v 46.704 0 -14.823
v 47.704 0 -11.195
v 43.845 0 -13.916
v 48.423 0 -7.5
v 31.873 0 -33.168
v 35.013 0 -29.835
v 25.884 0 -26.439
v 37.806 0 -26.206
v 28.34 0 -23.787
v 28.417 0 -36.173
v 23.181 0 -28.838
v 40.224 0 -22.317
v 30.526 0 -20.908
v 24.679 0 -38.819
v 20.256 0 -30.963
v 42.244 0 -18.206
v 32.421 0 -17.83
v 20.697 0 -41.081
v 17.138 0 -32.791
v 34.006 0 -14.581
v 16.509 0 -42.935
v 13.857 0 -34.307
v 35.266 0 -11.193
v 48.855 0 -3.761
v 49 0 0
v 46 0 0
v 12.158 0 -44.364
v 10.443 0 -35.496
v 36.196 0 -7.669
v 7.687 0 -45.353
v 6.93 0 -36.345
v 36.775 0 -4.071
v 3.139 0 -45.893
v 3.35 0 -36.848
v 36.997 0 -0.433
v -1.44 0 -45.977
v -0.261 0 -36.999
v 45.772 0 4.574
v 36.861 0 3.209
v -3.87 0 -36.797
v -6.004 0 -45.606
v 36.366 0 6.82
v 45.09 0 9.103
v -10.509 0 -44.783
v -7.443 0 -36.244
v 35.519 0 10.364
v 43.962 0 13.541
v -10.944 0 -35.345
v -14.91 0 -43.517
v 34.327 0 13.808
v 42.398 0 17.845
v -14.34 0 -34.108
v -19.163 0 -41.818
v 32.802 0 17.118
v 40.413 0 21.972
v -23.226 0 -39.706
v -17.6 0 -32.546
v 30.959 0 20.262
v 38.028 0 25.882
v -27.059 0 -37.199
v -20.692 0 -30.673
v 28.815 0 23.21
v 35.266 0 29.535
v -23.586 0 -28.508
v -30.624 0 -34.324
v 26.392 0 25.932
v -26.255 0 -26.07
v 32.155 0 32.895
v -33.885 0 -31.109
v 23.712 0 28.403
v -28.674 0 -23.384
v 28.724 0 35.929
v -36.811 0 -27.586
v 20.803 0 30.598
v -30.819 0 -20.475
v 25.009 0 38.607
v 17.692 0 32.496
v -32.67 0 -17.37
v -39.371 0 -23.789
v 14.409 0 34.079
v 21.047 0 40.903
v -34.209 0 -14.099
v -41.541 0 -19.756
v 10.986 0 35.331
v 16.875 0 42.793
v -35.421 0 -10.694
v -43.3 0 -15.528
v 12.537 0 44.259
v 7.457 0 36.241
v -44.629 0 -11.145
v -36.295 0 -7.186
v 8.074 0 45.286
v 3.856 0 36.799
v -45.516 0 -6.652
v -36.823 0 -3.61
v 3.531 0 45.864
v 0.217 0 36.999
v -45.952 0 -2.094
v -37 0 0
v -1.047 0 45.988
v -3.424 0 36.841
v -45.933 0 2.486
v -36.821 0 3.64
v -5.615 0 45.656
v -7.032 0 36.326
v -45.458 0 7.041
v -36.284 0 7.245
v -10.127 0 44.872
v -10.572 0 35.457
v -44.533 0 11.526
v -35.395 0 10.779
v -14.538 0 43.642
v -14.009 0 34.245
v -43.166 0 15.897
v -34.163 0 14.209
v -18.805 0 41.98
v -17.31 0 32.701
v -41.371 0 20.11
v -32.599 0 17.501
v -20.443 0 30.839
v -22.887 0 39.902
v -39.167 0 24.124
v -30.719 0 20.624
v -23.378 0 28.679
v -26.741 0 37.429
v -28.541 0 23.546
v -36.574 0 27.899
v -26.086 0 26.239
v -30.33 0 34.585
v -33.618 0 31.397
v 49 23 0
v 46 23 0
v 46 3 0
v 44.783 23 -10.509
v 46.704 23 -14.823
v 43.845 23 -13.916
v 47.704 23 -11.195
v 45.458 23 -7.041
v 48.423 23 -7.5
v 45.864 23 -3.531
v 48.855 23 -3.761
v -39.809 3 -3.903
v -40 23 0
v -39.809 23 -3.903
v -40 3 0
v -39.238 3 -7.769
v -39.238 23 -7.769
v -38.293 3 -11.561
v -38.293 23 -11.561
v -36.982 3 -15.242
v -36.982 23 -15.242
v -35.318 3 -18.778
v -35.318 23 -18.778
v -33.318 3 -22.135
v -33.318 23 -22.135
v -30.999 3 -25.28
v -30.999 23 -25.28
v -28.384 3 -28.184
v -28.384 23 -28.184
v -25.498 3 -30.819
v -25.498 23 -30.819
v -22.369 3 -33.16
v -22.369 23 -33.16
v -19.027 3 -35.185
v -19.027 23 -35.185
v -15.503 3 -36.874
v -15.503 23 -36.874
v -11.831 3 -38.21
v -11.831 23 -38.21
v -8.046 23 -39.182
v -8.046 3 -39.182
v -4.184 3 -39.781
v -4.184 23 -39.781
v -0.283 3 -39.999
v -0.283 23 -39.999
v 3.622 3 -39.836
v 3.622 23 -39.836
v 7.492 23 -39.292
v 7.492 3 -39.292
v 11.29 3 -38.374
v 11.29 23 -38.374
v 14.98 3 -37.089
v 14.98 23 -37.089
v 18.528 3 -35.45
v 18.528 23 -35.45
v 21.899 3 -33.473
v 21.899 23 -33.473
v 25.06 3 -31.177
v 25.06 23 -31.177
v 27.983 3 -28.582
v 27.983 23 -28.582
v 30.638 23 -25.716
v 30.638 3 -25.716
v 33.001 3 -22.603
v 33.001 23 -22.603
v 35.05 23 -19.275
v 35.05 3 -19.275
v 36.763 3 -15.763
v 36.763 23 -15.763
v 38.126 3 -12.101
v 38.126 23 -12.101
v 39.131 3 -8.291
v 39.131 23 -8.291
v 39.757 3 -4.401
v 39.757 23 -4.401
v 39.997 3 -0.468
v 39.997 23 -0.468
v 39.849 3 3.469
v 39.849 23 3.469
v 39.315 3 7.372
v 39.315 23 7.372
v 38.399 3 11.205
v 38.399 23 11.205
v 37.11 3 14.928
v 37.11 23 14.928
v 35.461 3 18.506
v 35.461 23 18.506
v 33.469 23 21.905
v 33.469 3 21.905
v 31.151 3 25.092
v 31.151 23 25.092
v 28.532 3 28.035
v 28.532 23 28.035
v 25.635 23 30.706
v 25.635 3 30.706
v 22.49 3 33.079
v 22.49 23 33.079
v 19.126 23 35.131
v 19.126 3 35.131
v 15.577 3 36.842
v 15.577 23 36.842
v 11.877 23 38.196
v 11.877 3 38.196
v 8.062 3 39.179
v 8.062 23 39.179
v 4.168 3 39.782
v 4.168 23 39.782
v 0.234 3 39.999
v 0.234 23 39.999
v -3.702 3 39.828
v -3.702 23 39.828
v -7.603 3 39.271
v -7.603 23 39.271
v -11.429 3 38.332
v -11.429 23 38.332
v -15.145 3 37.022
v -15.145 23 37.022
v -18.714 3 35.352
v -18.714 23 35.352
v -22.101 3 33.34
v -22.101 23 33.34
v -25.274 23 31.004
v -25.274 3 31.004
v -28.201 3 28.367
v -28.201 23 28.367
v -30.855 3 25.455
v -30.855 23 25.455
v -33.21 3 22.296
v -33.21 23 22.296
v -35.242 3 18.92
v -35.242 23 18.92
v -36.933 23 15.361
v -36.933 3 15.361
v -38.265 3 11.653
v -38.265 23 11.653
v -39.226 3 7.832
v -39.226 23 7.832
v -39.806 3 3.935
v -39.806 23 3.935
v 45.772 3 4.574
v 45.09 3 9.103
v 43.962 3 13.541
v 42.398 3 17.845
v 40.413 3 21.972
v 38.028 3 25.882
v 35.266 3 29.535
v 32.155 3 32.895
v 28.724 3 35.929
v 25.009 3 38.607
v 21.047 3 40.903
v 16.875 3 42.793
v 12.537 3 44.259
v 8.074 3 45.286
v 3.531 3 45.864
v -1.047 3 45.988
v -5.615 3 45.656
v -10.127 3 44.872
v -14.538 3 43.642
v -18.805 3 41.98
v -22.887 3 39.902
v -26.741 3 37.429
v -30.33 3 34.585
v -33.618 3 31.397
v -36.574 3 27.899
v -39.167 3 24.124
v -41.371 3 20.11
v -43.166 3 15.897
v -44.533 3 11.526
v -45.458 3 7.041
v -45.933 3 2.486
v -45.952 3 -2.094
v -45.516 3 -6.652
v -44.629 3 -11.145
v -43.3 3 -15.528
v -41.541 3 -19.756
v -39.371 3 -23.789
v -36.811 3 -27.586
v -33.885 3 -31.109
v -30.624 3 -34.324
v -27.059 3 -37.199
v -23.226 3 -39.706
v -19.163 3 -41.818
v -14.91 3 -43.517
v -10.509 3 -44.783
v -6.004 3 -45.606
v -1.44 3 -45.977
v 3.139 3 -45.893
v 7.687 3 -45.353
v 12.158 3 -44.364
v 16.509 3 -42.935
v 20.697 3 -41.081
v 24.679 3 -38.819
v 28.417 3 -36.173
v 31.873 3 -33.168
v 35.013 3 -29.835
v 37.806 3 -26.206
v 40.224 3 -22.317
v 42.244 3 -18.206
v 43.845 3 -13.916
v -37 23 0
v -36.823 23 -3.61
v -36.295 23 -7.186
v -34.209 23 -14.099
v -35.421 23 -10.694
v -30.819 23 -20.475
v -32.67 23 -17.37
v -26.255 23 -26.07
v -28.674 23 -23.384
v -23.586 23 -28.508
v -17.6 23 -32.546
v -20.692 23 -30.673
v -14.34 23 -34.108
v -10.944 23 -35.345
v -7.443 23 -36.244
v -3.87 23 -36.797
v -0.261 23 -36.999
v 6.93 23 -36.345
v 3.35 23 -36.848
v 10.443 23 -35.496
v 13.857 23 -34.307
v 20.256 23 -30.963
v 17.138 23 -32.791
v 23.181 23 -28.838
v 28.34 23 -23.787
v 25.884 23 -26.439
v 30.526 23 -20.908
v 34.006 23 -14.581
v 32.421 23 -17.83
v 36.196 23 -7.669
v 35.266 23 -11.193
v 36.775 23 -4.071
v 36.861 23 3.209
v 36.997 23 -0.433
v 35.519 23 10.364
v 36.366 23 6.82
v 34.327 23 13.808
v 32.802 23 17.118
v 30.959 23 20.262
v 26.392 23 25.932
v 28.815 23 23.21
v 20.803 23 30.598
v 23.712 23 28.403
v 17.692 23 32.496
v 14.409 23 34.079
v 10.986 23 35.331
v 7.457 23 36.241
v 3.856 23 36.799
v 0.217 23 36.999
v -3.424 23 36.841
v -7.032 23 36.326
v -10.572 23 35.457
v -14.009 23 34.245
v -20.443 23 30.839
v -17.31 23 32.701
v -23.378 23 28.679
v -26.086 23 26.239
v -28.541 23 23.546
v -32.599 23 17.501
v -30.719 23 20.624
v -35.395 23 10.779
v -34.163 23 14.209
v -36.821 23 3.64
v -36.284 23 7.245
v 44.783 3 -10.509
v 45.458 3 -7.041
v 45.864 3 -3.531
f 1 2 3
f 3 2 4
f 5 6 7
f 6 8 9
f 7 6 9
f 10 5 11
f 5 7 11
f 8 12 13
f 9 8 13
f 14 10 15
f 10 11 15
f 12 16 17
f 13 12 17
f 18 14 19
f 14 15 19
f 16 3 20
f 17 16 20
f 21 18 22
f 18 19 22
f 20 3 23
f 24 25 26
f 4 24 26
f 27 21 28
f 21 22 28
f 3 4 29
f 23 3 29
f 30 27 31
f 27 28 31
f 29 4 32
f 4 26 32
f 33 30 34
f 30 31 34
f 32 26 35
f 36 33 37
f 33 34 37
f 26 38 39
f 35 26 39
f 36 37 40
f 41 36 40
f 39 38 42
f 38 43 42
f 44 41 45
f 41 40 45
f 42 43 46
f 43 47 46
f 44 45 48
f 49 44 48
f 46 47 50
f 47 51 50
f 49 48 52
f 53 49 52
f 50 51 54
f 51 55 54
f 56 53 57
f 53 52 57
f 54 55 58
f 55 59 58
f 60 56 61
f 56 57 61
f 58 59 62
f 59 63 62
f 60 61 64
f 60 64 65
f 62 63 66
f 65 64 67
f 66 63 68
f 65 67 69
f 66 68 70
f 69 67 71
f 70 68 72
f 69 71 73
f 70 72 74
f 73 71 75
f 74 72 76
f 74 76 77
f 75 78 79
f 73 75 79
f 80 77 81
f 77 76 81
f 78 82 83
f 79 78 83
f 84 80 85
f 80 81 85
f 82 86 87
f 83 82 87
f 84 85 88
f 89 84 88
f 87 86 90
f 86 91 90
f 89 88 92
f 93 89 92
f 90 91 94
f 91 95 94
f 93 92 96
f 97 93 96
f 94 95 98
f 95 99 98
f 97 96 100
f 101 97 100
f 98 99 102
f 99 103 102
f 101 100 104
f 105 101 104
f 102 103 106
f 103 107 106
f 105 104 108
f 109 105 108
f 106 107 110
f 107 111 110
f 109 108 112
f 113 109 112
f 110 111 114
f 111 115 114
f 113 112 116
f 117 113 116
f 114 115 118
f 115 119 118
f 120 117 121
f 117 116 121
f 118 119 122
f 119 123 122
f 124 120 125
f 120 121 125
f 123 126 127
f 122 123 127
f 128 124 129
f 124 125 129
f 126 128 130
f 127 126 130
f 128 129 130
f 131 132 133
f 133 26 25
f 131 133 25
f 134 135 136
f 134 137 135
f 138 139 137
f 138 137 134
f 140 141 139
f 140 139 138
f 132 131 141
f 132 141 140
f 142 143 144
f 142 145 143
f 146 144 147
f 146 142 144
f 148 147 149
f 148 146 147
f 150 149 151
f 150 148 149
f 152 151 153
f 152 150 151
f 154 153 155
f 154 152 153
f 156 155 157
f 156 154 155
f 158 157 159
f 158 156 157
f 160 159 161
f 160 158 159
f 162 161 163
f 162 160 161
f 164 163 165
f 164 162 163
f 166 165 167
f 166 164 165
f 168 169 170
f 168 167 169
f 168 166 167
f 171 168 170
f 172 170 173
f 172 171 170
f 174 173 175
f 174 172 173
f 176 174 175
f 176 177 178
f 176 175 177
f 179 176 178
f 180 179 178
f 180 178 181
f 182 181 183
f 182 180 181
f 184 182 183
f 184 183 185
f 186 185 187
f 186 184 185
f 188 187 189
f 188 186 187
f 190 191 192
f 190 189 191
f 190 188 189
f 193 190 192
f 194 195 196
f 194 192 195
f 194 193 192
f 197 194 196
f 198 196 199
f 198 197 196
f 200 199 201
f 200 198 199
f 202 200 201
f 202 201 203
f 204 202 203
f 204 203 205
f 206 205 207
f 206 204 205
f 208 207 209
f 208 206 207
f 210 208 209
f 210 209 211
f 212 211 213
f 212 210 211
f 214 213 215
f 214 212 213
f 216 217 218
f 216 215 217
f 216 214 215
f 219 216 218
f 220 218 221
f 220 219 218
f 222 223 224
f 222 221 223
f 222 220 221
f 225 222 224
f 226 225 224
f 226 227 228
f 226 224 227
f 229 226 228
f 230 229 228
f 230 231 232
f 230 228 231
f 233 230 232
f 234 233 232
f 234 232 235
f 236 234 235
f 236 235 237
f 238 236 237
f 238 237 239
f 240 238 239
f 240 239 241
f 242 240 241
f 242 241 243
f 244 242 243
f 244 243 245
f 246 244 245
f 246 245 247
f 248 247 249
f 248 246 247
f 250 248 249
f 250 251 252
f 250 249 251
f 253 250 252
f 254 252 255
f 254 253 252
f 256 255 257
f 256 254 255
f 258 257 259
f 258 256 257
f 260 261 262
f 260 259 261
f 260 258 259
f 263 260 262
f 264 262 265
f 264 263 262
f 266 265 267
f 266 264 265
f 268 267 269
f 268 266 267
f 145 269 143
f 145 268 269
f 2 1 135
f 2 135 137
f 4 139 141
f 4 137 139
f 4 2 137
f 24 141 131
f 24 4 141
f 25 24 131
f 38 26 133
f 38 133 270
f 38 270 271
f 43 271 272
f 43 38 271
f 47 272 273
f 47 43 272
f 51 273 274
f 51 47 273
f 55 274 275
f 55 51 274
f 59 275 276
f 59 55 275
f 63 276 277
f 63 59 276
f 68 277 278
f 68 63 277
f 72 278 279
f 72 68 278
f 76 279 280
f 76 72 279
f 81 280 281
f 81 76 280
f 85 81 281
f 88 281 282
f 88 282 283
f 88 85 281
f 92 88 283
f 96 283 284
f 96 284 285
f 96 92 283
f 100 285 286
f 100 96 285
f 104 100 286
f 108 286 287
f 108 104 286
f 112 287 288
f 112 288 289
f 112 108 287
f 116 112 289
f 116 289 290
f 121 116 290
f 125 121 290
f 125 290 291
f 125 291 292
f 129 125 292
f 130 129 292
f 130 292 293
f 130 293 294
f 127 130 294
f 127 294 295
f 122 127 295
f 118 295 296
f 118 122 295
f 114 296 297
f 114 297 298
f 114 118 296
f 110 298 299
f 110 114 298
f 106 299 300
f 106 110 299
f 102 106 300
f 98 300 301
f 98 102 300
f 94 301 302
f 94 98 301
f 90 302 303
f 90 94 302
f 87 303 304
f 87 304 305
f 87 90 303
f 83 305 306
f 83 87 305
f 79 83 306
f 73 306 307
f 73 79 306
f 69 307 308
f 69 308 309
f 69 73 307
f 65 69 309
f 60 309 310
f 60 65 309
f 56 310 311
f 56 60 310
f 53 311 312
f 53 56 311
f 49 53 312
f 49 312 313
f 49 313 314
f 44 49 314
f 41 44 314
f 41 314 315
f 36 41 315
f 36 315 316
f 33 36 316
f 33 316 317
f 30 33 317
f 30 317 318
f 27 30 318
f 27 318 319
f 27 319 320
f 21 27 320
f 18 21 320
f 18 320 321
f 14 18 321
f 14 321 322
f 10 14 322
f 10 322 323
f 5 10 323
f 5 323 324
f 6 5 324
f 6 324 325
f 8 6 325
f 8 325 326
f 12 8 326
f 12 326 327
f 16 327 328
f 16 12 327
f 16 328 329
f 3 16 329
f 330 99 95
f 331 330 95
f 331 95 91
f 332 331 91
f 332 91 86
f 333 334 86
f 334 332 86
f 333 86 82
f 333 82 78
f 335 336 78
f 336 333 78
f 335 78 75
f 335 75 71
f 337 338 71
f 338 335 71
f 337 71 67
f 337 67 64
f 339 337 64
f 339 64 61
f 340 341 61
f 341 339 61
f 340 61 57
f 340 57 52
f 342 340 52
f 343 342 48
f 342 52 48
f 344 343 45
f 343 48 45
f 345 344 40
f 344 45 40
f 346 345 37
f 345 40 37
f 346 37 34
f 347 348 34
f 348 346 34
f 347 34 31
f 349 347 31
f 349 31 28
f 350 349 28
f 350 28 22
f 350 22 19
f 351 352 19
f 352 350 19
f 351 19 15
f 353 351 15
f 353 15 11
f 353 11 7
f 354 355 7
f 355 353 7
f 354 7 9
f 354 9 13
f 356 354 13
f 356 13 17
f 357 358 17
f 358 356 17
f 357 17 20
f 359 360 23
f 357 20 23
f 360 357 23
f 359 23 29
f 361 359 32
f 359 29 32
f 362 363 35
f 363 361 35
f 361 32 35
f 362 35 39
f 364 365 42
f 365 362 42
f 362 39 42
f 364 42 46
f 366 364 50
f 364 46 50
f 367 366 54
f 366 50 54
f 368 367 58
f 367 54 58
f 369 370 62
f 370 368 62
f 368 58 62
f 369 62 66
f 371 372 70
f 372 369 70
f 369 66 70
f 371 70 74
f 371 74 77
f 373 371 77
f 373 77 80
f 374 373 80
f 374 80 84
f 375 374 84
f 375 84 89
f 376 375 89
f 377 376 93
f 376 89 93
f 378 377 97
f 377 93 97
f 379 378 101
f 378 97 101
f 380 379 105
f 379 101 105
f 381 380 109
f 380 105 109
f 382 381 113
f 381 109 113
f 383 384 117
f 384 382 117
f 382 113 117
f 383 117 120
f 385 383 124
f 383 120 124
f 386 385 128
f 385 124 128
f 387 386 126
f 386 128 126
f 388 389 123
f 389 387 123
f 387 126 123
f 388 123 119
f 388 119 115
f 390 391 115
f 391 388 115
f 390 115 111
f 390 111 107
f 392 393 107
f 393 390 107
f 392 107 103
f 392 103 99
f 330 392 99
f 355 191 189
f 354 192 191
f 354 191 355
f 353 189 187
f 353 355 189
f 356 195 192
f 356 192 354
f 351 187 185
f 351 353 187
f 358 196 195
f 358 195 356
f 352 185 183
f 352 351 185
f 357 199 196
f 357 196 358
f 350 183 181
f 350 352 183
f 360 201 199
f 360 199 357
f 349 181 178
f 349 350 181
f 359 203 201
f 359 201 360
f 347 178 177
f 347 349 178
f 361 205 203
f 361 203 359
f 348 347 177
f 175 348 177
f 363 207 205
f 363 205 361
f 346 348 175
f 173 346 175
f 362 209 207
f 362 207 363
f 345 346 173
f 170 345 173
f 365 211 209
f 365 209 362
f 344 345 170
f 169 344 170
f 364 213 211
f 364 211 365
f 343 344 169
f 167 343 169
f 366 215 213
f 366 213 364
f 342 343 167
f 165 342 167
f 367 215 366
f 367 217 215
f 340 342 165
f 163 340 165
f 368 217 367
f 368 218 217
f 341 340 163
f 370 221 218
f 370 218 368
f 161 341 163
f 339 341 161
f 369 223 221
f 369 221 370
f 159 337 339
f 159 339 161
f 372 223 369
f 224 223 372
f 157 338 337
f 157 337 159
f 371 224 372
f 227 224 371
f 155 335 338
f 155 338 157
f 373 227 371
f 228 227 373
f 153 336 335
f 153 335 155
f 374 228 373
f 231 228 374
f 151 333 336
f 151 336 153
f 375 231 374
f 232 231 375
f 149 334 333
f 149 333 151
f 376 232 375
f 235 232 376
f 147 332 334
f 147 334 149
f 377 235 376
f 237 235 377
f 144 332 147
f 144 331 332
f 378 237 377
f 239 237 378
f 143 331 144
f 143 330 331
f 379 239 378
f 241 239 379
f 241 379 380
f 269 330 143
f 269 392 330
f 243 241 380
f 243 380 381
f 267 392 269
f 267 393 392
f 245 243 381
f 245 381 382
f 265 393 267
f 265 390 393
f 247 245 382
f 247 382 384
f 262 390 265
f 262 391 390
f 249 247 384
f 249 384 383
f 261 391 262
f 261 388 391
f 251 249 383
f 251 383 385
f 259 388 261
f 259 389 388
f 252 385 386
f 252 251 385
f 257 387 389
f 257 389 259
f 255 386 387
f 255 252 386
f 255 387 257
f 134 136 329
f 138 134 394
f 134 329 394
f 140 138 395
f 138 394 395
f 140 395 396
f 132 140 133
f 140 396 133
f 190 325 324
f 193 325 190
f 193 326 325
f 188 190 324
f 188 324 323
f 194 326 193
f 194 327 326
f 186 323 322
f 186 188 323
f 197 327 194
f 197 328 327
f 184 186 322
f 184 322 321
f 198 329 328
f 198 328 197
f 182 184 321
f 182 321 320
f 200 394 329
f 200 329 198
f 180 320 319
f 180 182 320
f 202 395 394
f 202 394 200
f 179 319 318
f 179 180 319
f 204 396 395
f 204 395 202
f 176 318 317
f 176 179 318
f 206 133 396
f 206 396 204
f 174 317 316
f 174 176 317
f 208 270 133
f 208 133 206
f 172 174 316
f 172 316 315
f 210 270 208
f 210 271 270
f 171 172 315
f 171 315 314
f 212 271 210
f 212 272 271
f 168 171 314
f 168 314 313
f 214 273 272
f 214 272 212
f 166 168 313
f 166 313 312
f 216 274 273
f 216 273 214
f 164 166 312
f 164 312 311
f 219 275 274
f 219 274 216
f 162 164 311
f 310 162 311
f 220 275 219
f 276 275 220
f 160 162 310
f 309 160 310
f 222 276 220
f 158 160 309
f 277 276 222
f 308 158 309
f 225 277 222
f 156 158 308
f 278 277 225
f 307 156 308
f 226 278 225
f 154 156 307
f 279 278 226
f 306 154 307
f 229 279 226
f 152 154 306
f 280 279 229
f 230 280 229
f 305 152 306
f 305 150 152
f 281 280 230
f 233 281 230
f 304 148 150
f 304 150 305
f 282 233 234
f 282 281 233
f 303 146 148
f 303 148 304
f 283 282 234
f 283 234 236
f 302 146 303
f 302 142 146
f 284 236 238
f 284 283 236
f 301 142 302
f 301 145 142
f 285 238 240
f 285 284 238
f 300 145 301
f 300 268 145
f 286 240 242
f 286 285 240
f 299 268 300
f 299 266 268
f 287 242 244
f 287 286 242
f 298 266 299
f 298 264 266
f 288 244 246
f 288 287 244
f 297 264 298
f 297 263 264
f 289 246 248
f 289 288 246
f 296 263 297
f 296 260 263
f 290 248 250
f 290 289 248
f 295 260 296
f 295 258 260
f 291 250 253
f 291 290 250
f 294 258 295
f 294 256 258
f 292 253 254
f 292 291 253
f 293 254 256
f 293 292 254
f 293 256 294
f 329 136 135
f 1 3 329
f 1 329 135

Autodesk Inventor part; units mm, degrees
ref_plane "YZ Plane" through (0, 0, 0) normal (1, 0, 0) x (0, 1, 0)
ref_plane "XZ Plane" through (0, 0, 0) normal (0, 1, 0) x (-1, 0, 0)
ref_plane "XY Plane" through (0, 0, 0) normal (0, 0, 1) x (1, 0, 0)
sketch "Sketch1" plane through (0, 0, 0) normal (0, 1, 0) x (-1, 0, 0)
  circle A0 centre (0, 0) radius 40
  circle A1 centre (0, 0) radius 46
  circle A2 centre (0, 0) radius 37
  circle A3 centre (0, 0) radius 49
  line L0 (-46, 0) -> (-49, 0)
  line L1 (0, 0) -> (-46.7041, -14.8233)
  point P0 (-43.8446, -13.9157)
  dimension "d0" = 80
  dimension "d1" = 6
  dimension "d2" = 3
  dimension "d7" = 3
  dimension "d8" = 15
extrude "Extrusion1" add sketch "Sketch1" along normal blind 23 contours A0
extrude "Extrusion2" add sketch "Sketch1" along normal blind 3 contours A1
extrude "Extrusion3" add sketch "Sketch1" along normal up to surface (23 mm away) contours L1 A3 L0 A1 picked at (-46.1746, -12.9028)
properties part number "80mm-CoilForm_3DPrint"
